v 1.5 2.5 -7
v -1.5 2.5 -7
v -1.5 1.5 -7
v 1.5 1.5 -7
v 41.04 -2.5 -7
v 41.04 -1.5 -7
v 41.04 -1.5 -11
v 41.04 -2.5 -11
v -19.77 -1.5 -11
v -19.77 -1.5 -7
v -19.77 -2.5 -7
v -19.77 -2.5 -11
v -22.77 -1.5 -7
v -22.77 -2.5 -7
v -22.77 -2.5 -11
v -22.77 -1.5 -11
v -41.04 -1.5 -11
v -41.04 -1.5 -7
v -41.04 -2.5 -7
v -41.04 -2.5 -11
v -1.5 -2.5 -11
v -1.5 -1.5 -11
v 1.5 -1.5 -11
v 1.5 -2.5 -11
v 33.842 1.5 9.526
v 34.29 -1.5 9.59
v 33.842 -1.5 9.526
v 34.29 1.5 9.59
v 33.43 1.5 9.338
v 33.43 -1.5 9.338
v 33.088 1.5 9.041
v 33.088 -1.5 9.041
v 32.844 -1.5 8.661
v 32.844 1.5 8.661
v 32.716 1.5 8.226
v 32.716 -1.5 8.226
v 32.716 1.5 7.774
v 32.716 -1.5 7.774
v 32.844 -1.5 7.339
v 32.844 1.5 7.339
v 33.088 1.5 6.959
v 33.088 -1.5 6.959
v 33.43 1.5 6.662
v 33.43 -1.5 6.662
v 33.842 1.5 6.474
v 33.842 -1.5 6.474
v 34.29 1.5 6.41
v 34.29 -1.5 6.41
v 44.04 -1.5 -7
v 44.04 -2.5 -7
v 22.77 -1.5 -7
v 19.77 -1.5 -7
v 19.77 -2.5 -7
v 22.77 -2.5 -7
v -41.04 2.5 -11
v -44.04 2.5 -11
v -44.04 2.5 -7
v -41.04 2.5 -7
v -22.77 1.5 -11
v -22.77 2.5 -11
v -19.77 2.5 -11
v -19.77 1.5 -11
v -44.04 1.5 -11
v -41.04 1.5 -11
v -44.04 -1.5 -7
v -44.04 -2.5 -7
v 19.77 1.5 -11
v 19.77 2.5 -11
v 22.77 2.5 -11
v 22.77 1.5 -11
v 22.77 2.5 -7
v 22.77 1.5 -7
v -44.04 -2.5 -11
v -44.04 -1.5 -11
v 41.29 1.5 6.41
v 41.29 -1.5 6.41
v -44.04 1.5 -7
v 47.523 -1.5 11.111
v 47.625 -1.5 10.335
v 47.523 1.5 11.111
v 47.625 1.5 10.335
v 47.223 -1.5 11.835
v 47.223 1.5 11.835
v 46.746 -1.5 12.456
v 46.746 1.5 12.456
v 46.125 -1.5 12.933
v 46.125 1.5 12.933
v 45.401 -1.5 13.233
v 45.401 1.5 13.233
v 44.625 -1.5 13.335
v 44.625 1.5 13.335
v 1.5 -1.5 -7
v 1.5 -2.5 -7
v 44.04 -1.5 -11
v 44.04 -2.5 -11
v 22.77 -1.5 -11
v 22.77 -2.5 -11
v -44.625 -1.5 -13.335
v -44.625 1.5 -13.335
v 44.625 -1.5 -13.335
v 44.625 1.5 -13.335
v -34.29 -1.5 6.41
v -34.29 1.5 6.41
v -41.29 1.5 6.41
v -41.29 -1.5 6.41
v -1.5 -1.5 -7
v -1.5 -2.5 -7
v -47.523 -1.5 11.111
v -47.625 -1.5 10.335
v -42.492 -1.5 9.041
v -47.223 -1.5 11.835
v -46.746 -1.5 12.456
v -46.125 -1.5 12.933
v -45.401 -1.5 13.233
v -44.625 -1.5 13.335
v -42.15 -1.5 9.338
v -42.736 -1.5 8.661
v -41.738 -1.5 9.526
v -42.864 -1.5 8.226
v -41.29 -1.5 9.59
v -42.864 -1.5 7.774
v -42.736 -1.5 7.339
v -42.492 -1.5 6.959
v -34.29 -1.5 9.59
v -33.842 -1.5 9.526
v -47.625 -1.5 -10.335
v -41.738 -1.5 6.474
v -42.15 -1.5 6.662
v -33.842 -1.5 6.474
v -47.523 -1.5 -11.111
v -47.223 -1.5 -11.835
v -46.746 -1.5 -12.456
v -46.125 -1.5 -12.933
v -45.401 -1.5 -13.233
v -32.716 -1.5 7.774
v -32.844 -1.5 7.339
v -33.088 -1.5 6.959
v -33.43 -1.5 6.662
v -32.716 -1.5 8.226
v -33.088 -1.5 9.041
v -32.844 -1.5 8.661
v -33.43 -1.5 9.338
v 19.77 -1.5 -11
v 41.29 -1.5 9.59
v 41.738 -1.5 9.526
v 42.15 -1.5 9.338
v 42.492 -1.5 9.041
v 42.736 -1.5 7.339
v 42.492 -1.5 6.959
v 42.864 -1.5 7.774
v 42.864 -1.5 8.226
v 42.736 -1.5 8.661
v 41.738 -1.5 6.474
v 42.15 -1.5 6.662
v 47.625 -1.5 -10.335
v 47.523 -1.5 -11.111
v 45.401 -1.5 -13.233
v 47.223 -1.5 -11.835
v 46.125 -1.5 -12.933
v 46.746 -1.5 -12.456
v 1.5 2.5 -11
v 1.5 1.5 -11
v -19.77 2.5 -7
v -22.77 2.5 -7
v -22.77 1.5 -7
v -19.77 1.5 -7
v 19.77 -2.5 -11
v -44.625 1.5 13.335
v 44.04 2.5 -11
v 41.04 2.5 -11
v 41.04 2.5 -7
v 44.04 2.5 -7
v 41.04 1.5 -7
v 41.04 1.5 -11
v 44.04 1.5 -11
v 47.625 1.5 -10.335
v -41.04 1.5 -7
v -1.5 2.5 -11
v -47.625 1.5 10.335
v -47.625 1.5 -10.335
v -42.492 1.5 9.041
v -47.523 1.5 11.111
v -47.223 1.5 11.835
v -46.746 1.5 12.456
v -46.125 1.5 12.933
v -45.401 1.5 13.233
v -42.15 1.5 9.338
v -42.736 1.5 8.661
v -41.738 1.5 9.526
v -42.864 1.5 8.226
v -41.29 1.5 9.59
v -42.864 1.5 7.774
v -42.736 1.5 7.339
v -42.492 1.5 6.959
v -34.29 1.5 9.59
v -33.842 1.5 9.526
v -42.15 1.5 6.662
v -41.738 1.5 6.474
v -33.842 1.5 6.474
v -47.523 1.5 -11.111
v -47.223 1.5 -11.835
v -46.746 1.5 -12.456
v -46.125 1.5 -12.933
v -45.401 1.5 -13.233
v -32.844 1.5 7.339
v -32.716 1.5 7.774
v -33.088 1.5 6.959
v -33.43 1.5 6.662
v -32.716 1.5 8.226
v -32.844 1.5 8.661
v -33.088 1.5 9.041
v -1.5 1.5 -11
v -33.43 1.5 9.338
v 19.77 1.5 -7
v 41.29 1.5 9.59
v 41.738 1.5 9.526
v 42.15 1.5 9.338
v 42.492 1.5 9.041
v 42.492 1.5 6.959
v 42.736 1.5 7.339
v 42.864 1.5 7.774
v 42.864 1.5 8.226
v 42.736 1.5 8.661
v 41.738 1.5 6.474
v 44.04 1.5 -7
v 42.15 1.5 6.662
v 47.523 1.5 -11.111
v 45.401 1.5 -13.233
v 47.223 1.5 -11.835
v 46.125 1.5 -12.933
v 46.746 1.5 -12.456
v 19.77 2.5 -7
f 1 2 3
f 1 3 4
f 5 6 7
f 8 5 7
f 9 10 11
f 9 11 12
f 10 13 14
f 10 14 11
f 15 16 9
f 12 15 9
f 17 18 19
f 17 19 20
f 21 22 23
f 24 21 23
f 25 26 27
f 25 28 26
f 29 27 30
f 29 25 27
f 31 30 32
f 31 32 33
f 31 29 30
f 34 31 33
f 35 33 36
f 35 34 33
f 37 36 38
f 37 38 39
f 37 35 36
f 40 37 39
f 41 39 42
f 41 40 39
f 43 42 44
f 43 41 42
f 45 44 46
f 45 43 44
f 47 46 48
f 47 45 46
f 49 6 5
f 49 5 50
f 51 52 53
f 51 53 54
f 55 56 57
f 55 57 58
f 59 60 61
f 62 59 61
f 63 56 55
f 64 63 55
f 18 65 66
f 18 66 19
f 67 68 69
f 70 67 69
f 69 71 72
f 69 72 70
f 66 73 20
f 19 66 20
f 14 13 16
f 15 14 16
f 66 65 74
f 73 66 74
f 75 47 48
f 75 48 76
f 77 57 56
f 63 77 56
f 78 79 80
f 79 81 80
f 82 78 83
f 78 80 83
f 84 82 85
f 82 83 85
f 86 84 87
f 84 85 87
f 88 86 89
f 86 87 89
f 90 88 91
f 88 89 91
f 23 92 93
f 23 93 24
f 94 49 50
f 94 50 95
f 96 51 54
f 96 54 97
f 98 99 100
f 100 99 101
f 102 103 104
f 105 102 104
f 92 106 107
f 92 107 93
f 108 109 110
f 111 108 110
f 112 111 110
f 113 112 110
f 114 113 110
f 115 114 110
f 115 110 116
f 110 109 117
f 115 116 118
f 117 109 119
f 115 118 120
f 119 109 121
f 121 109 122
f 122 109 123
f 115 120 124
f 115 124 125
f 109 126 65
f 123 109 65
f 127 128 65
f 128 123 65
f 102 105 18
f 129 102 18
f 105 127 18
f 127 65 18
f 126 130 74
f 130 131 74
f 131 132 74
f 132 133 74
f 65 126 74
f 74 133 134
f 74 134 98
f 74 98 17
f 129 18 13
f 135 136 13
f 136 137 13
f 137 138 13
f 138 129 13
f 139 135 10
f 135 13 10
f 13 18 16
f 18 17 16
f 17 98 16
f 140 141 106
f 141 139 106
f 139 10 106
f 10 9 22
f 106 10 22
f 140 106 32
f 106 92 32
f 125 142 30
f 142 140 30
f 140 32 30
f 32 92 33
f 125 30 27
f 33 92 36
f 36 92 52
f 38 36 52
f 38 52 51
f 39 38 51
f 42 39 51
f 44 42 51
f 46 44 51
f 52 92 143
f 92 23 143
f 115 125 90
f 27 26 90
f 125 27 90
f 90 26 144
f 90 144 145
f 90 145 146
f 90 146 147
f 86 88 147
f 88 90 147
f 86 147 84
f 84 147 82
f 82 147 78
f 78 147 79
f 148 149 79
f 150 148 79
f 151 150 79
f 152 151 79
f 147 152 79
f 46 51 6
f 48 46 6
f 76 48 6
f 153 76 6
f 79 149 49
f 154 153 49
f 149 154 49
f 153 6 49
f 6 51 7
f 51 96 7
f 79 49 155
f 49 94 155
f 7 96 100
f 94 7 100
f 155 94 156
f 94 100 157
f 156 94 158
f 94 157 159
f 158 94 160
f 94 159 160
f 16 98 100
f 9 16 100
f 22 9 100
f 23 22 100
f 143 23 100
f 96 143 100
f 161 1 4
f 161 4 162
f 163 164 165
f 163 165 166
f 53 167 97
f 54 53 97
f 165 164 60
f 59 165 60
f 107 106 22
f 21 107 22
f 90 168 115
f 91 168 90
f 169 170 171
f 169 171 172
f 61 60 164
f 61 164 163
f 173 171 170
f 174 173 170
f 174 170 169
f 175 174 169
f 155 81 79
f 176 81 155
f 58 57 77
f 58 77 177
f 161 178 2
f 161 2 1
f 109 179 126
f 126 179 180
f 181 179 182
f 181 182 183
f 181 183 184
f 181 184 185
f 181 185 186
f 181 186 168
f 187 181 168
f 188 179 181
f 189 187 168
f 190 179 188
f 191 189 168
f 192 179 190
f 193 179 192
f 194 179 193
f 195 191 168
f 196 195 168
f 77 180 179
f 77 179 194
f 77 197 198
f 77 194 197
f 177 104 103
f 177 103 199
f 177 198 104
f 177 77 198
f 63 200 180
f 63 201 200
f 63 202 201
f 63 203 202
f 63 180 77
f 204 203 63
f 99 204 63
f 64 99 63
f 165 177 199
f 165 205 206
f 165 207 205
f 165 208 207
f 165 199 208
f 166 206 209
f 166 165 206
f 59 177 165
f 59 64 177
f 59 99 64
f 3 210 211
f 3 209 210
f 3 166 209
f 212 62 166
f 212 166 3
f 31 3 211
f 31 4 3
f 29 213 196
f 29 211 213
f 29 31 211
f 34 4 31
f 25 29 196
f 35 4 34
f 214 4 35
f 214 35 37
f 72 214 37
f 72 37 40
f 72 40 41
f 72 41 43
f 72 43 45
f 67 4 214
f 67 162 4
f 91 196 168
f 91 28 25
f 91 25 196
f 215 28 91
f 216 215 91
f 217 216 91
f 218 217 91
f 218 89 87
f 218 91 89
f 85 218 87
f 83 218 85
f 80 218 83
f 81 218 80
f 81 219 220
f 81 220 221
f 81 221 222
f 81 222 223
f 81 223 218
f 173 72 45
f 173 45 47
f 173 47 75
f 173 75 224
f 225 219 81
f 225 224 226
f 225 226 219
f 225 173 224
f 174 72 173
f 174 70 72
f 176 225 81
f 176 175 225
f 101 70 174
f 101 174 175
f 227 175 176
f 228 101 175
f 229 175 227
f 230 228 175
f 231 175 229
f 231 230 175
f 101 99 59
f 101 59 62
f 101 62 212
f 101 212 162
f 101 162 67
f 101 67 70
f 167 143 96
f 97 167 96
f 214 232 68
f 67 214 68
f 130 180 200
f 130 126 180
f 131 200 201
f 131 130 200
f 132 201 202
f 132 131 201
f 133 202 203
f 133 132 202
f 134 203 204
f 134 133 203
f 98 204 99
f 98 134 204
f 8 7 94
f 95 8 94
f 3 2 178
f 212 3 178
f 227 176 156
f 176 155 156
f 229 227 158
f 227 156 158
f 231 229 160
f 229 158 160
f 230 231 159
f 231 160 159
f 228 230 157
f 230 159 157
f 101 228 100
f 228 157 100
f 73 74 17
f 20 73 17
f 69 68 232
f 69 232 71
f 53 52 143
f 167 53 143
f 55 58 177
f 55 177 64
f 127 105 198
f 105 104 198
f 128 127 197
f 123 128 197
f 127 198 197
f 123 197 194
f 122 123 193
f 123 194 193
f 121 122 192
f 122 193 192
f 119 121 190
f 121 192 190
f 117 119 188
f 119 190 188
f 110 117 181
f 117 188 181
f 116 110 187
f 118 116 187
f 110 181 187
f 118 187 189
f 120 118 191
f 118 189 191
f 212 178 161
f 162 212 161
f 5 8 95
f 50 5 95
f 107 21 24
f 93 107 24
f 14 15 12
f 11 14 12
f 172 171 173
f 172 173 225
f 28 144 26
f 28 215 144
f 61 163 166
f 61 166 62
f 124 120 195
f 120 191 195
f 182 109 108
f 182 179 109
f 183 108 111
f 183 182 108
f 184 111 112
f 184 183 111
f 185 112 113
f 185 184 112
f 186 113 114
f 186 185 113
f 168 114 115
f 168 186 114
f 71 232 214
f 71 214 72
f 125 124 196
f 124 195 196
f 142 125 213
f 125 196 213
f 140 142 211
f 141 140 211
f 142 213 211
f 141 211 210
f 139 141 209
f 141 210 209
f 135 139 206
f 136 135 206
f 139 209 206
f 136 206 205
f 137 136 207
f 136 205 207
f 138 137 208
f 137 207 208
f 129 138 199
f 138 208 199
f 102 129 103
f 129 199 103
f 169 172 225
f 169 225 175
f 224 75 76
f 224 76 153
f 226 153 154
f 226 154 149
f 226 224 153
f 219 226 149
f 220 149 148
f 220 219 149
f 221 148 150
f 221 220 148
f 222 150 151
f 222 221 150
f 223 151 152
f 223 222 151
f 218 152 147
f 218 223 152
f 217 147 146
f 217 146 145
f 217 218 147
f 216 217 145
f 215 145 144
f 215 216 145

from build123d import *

# Parameters (mm, degrees)
SKETCH_1_W                 = 95.25
SKETCH_1_H                 = 26.67
EXTRUDE_1_DEPTH            = 1.5
FILLET_1_R                 = 3
SKETCH_2_W                 = 3
SKETCH_2_H                 = 4
EXTRUDE_2_DEPTH            = 2.5
PATTERN_LINEAR_1_COUNT     = 3
PATTERN_LINEAR_1_PITCH     = 21.27
PATTERN_LINEAR_1_COL_COUNT = 3
PATTERN_LINEAR_1_COL_PITCH = 21.27


with BuildPart() as part:
    # 草图1 → 凸台-拉伸1 (new, symmetric)
    with BuildSketch(Plane(origin=(0, 0, 0), x_dir=(1, 0, 0), z_dir=(0, 1, 0))):
        Rectangle(SKETCH_1_W, SKETCH_1_H)
        with BuildLine():
            Line((34.29, -6.41), (41.29, -6.41))
            ThreePointArc((41.29, -6.41), (42.88, -8), (41.29, -9.59))
            Line((41.29, -9.59), (34.29, -9.59))
            ThreePointArc((34.29, -9.59), (32.7, -8), (34.29, -6.41))
        make_face(mode=Mode.SUBTRACT)
        with BuildLine():
            Line((-34.29, -6.41), (-41.29, -6.41))
            ThreePointArc((-41.29, -6.41), (-42.88, -8), (-41.29, -9.59))
            Line((-41.29, -9.59), (-34.29, -9.59))
            ThreePointArc((-34.29, -9.59), (-32.7, -8), (-34.29, -6.41))
        make_face(mode=Mode.SUBTRACT)
    extrude(amount=EXTRUDE_1_DEPTH, both=True)

    # 圆角1
    fillet_1_edges = [part.edges().sort_by_distance(p)[0] for p in [
        (47.625, 0, 13.335),
        (-47.625, 0, 13.335),
        (-47.625, 0, -13.335),
        (47.625, 0, -13.335),
    ]]
    fillet(fillet_1_edges, radius=FILLET_1_R)

    # 草图2 → 凸台-拉伸2 (add, symmetric)
    with BuildSketch(Plane(origin=(0, 0, 0), x_dir=(1, 0, 0), z_dir=(0, 1, 0))):
        with Locations((0, 9)):
            Rectangle(SKETCH_2_W, SKETCH_2_H)
    extrude_2 = extrude(amount=EXTRUDE_2_DEPTH, both=True)

    # 阵列(线性)1: 凸台-拉伸2 ×3
    with Locations(*[(i * PATTERN_LINEAR_1_PITCH, 0, 0) for i in range(1, PATTERN_LINEAR_1_COUNT)]):
        add(extrude_2)

    # 阵列(线性)1 col: 凸台-拉伸2 ×3
    with Locations(*[(-i * PATTERN_LINEAR_1_COL_PITCH, 0, 0) for i in range(1, PATTERN_LINEAR_1_COL_COUNT)]):
        add(extrude_2)


solid = part.part
